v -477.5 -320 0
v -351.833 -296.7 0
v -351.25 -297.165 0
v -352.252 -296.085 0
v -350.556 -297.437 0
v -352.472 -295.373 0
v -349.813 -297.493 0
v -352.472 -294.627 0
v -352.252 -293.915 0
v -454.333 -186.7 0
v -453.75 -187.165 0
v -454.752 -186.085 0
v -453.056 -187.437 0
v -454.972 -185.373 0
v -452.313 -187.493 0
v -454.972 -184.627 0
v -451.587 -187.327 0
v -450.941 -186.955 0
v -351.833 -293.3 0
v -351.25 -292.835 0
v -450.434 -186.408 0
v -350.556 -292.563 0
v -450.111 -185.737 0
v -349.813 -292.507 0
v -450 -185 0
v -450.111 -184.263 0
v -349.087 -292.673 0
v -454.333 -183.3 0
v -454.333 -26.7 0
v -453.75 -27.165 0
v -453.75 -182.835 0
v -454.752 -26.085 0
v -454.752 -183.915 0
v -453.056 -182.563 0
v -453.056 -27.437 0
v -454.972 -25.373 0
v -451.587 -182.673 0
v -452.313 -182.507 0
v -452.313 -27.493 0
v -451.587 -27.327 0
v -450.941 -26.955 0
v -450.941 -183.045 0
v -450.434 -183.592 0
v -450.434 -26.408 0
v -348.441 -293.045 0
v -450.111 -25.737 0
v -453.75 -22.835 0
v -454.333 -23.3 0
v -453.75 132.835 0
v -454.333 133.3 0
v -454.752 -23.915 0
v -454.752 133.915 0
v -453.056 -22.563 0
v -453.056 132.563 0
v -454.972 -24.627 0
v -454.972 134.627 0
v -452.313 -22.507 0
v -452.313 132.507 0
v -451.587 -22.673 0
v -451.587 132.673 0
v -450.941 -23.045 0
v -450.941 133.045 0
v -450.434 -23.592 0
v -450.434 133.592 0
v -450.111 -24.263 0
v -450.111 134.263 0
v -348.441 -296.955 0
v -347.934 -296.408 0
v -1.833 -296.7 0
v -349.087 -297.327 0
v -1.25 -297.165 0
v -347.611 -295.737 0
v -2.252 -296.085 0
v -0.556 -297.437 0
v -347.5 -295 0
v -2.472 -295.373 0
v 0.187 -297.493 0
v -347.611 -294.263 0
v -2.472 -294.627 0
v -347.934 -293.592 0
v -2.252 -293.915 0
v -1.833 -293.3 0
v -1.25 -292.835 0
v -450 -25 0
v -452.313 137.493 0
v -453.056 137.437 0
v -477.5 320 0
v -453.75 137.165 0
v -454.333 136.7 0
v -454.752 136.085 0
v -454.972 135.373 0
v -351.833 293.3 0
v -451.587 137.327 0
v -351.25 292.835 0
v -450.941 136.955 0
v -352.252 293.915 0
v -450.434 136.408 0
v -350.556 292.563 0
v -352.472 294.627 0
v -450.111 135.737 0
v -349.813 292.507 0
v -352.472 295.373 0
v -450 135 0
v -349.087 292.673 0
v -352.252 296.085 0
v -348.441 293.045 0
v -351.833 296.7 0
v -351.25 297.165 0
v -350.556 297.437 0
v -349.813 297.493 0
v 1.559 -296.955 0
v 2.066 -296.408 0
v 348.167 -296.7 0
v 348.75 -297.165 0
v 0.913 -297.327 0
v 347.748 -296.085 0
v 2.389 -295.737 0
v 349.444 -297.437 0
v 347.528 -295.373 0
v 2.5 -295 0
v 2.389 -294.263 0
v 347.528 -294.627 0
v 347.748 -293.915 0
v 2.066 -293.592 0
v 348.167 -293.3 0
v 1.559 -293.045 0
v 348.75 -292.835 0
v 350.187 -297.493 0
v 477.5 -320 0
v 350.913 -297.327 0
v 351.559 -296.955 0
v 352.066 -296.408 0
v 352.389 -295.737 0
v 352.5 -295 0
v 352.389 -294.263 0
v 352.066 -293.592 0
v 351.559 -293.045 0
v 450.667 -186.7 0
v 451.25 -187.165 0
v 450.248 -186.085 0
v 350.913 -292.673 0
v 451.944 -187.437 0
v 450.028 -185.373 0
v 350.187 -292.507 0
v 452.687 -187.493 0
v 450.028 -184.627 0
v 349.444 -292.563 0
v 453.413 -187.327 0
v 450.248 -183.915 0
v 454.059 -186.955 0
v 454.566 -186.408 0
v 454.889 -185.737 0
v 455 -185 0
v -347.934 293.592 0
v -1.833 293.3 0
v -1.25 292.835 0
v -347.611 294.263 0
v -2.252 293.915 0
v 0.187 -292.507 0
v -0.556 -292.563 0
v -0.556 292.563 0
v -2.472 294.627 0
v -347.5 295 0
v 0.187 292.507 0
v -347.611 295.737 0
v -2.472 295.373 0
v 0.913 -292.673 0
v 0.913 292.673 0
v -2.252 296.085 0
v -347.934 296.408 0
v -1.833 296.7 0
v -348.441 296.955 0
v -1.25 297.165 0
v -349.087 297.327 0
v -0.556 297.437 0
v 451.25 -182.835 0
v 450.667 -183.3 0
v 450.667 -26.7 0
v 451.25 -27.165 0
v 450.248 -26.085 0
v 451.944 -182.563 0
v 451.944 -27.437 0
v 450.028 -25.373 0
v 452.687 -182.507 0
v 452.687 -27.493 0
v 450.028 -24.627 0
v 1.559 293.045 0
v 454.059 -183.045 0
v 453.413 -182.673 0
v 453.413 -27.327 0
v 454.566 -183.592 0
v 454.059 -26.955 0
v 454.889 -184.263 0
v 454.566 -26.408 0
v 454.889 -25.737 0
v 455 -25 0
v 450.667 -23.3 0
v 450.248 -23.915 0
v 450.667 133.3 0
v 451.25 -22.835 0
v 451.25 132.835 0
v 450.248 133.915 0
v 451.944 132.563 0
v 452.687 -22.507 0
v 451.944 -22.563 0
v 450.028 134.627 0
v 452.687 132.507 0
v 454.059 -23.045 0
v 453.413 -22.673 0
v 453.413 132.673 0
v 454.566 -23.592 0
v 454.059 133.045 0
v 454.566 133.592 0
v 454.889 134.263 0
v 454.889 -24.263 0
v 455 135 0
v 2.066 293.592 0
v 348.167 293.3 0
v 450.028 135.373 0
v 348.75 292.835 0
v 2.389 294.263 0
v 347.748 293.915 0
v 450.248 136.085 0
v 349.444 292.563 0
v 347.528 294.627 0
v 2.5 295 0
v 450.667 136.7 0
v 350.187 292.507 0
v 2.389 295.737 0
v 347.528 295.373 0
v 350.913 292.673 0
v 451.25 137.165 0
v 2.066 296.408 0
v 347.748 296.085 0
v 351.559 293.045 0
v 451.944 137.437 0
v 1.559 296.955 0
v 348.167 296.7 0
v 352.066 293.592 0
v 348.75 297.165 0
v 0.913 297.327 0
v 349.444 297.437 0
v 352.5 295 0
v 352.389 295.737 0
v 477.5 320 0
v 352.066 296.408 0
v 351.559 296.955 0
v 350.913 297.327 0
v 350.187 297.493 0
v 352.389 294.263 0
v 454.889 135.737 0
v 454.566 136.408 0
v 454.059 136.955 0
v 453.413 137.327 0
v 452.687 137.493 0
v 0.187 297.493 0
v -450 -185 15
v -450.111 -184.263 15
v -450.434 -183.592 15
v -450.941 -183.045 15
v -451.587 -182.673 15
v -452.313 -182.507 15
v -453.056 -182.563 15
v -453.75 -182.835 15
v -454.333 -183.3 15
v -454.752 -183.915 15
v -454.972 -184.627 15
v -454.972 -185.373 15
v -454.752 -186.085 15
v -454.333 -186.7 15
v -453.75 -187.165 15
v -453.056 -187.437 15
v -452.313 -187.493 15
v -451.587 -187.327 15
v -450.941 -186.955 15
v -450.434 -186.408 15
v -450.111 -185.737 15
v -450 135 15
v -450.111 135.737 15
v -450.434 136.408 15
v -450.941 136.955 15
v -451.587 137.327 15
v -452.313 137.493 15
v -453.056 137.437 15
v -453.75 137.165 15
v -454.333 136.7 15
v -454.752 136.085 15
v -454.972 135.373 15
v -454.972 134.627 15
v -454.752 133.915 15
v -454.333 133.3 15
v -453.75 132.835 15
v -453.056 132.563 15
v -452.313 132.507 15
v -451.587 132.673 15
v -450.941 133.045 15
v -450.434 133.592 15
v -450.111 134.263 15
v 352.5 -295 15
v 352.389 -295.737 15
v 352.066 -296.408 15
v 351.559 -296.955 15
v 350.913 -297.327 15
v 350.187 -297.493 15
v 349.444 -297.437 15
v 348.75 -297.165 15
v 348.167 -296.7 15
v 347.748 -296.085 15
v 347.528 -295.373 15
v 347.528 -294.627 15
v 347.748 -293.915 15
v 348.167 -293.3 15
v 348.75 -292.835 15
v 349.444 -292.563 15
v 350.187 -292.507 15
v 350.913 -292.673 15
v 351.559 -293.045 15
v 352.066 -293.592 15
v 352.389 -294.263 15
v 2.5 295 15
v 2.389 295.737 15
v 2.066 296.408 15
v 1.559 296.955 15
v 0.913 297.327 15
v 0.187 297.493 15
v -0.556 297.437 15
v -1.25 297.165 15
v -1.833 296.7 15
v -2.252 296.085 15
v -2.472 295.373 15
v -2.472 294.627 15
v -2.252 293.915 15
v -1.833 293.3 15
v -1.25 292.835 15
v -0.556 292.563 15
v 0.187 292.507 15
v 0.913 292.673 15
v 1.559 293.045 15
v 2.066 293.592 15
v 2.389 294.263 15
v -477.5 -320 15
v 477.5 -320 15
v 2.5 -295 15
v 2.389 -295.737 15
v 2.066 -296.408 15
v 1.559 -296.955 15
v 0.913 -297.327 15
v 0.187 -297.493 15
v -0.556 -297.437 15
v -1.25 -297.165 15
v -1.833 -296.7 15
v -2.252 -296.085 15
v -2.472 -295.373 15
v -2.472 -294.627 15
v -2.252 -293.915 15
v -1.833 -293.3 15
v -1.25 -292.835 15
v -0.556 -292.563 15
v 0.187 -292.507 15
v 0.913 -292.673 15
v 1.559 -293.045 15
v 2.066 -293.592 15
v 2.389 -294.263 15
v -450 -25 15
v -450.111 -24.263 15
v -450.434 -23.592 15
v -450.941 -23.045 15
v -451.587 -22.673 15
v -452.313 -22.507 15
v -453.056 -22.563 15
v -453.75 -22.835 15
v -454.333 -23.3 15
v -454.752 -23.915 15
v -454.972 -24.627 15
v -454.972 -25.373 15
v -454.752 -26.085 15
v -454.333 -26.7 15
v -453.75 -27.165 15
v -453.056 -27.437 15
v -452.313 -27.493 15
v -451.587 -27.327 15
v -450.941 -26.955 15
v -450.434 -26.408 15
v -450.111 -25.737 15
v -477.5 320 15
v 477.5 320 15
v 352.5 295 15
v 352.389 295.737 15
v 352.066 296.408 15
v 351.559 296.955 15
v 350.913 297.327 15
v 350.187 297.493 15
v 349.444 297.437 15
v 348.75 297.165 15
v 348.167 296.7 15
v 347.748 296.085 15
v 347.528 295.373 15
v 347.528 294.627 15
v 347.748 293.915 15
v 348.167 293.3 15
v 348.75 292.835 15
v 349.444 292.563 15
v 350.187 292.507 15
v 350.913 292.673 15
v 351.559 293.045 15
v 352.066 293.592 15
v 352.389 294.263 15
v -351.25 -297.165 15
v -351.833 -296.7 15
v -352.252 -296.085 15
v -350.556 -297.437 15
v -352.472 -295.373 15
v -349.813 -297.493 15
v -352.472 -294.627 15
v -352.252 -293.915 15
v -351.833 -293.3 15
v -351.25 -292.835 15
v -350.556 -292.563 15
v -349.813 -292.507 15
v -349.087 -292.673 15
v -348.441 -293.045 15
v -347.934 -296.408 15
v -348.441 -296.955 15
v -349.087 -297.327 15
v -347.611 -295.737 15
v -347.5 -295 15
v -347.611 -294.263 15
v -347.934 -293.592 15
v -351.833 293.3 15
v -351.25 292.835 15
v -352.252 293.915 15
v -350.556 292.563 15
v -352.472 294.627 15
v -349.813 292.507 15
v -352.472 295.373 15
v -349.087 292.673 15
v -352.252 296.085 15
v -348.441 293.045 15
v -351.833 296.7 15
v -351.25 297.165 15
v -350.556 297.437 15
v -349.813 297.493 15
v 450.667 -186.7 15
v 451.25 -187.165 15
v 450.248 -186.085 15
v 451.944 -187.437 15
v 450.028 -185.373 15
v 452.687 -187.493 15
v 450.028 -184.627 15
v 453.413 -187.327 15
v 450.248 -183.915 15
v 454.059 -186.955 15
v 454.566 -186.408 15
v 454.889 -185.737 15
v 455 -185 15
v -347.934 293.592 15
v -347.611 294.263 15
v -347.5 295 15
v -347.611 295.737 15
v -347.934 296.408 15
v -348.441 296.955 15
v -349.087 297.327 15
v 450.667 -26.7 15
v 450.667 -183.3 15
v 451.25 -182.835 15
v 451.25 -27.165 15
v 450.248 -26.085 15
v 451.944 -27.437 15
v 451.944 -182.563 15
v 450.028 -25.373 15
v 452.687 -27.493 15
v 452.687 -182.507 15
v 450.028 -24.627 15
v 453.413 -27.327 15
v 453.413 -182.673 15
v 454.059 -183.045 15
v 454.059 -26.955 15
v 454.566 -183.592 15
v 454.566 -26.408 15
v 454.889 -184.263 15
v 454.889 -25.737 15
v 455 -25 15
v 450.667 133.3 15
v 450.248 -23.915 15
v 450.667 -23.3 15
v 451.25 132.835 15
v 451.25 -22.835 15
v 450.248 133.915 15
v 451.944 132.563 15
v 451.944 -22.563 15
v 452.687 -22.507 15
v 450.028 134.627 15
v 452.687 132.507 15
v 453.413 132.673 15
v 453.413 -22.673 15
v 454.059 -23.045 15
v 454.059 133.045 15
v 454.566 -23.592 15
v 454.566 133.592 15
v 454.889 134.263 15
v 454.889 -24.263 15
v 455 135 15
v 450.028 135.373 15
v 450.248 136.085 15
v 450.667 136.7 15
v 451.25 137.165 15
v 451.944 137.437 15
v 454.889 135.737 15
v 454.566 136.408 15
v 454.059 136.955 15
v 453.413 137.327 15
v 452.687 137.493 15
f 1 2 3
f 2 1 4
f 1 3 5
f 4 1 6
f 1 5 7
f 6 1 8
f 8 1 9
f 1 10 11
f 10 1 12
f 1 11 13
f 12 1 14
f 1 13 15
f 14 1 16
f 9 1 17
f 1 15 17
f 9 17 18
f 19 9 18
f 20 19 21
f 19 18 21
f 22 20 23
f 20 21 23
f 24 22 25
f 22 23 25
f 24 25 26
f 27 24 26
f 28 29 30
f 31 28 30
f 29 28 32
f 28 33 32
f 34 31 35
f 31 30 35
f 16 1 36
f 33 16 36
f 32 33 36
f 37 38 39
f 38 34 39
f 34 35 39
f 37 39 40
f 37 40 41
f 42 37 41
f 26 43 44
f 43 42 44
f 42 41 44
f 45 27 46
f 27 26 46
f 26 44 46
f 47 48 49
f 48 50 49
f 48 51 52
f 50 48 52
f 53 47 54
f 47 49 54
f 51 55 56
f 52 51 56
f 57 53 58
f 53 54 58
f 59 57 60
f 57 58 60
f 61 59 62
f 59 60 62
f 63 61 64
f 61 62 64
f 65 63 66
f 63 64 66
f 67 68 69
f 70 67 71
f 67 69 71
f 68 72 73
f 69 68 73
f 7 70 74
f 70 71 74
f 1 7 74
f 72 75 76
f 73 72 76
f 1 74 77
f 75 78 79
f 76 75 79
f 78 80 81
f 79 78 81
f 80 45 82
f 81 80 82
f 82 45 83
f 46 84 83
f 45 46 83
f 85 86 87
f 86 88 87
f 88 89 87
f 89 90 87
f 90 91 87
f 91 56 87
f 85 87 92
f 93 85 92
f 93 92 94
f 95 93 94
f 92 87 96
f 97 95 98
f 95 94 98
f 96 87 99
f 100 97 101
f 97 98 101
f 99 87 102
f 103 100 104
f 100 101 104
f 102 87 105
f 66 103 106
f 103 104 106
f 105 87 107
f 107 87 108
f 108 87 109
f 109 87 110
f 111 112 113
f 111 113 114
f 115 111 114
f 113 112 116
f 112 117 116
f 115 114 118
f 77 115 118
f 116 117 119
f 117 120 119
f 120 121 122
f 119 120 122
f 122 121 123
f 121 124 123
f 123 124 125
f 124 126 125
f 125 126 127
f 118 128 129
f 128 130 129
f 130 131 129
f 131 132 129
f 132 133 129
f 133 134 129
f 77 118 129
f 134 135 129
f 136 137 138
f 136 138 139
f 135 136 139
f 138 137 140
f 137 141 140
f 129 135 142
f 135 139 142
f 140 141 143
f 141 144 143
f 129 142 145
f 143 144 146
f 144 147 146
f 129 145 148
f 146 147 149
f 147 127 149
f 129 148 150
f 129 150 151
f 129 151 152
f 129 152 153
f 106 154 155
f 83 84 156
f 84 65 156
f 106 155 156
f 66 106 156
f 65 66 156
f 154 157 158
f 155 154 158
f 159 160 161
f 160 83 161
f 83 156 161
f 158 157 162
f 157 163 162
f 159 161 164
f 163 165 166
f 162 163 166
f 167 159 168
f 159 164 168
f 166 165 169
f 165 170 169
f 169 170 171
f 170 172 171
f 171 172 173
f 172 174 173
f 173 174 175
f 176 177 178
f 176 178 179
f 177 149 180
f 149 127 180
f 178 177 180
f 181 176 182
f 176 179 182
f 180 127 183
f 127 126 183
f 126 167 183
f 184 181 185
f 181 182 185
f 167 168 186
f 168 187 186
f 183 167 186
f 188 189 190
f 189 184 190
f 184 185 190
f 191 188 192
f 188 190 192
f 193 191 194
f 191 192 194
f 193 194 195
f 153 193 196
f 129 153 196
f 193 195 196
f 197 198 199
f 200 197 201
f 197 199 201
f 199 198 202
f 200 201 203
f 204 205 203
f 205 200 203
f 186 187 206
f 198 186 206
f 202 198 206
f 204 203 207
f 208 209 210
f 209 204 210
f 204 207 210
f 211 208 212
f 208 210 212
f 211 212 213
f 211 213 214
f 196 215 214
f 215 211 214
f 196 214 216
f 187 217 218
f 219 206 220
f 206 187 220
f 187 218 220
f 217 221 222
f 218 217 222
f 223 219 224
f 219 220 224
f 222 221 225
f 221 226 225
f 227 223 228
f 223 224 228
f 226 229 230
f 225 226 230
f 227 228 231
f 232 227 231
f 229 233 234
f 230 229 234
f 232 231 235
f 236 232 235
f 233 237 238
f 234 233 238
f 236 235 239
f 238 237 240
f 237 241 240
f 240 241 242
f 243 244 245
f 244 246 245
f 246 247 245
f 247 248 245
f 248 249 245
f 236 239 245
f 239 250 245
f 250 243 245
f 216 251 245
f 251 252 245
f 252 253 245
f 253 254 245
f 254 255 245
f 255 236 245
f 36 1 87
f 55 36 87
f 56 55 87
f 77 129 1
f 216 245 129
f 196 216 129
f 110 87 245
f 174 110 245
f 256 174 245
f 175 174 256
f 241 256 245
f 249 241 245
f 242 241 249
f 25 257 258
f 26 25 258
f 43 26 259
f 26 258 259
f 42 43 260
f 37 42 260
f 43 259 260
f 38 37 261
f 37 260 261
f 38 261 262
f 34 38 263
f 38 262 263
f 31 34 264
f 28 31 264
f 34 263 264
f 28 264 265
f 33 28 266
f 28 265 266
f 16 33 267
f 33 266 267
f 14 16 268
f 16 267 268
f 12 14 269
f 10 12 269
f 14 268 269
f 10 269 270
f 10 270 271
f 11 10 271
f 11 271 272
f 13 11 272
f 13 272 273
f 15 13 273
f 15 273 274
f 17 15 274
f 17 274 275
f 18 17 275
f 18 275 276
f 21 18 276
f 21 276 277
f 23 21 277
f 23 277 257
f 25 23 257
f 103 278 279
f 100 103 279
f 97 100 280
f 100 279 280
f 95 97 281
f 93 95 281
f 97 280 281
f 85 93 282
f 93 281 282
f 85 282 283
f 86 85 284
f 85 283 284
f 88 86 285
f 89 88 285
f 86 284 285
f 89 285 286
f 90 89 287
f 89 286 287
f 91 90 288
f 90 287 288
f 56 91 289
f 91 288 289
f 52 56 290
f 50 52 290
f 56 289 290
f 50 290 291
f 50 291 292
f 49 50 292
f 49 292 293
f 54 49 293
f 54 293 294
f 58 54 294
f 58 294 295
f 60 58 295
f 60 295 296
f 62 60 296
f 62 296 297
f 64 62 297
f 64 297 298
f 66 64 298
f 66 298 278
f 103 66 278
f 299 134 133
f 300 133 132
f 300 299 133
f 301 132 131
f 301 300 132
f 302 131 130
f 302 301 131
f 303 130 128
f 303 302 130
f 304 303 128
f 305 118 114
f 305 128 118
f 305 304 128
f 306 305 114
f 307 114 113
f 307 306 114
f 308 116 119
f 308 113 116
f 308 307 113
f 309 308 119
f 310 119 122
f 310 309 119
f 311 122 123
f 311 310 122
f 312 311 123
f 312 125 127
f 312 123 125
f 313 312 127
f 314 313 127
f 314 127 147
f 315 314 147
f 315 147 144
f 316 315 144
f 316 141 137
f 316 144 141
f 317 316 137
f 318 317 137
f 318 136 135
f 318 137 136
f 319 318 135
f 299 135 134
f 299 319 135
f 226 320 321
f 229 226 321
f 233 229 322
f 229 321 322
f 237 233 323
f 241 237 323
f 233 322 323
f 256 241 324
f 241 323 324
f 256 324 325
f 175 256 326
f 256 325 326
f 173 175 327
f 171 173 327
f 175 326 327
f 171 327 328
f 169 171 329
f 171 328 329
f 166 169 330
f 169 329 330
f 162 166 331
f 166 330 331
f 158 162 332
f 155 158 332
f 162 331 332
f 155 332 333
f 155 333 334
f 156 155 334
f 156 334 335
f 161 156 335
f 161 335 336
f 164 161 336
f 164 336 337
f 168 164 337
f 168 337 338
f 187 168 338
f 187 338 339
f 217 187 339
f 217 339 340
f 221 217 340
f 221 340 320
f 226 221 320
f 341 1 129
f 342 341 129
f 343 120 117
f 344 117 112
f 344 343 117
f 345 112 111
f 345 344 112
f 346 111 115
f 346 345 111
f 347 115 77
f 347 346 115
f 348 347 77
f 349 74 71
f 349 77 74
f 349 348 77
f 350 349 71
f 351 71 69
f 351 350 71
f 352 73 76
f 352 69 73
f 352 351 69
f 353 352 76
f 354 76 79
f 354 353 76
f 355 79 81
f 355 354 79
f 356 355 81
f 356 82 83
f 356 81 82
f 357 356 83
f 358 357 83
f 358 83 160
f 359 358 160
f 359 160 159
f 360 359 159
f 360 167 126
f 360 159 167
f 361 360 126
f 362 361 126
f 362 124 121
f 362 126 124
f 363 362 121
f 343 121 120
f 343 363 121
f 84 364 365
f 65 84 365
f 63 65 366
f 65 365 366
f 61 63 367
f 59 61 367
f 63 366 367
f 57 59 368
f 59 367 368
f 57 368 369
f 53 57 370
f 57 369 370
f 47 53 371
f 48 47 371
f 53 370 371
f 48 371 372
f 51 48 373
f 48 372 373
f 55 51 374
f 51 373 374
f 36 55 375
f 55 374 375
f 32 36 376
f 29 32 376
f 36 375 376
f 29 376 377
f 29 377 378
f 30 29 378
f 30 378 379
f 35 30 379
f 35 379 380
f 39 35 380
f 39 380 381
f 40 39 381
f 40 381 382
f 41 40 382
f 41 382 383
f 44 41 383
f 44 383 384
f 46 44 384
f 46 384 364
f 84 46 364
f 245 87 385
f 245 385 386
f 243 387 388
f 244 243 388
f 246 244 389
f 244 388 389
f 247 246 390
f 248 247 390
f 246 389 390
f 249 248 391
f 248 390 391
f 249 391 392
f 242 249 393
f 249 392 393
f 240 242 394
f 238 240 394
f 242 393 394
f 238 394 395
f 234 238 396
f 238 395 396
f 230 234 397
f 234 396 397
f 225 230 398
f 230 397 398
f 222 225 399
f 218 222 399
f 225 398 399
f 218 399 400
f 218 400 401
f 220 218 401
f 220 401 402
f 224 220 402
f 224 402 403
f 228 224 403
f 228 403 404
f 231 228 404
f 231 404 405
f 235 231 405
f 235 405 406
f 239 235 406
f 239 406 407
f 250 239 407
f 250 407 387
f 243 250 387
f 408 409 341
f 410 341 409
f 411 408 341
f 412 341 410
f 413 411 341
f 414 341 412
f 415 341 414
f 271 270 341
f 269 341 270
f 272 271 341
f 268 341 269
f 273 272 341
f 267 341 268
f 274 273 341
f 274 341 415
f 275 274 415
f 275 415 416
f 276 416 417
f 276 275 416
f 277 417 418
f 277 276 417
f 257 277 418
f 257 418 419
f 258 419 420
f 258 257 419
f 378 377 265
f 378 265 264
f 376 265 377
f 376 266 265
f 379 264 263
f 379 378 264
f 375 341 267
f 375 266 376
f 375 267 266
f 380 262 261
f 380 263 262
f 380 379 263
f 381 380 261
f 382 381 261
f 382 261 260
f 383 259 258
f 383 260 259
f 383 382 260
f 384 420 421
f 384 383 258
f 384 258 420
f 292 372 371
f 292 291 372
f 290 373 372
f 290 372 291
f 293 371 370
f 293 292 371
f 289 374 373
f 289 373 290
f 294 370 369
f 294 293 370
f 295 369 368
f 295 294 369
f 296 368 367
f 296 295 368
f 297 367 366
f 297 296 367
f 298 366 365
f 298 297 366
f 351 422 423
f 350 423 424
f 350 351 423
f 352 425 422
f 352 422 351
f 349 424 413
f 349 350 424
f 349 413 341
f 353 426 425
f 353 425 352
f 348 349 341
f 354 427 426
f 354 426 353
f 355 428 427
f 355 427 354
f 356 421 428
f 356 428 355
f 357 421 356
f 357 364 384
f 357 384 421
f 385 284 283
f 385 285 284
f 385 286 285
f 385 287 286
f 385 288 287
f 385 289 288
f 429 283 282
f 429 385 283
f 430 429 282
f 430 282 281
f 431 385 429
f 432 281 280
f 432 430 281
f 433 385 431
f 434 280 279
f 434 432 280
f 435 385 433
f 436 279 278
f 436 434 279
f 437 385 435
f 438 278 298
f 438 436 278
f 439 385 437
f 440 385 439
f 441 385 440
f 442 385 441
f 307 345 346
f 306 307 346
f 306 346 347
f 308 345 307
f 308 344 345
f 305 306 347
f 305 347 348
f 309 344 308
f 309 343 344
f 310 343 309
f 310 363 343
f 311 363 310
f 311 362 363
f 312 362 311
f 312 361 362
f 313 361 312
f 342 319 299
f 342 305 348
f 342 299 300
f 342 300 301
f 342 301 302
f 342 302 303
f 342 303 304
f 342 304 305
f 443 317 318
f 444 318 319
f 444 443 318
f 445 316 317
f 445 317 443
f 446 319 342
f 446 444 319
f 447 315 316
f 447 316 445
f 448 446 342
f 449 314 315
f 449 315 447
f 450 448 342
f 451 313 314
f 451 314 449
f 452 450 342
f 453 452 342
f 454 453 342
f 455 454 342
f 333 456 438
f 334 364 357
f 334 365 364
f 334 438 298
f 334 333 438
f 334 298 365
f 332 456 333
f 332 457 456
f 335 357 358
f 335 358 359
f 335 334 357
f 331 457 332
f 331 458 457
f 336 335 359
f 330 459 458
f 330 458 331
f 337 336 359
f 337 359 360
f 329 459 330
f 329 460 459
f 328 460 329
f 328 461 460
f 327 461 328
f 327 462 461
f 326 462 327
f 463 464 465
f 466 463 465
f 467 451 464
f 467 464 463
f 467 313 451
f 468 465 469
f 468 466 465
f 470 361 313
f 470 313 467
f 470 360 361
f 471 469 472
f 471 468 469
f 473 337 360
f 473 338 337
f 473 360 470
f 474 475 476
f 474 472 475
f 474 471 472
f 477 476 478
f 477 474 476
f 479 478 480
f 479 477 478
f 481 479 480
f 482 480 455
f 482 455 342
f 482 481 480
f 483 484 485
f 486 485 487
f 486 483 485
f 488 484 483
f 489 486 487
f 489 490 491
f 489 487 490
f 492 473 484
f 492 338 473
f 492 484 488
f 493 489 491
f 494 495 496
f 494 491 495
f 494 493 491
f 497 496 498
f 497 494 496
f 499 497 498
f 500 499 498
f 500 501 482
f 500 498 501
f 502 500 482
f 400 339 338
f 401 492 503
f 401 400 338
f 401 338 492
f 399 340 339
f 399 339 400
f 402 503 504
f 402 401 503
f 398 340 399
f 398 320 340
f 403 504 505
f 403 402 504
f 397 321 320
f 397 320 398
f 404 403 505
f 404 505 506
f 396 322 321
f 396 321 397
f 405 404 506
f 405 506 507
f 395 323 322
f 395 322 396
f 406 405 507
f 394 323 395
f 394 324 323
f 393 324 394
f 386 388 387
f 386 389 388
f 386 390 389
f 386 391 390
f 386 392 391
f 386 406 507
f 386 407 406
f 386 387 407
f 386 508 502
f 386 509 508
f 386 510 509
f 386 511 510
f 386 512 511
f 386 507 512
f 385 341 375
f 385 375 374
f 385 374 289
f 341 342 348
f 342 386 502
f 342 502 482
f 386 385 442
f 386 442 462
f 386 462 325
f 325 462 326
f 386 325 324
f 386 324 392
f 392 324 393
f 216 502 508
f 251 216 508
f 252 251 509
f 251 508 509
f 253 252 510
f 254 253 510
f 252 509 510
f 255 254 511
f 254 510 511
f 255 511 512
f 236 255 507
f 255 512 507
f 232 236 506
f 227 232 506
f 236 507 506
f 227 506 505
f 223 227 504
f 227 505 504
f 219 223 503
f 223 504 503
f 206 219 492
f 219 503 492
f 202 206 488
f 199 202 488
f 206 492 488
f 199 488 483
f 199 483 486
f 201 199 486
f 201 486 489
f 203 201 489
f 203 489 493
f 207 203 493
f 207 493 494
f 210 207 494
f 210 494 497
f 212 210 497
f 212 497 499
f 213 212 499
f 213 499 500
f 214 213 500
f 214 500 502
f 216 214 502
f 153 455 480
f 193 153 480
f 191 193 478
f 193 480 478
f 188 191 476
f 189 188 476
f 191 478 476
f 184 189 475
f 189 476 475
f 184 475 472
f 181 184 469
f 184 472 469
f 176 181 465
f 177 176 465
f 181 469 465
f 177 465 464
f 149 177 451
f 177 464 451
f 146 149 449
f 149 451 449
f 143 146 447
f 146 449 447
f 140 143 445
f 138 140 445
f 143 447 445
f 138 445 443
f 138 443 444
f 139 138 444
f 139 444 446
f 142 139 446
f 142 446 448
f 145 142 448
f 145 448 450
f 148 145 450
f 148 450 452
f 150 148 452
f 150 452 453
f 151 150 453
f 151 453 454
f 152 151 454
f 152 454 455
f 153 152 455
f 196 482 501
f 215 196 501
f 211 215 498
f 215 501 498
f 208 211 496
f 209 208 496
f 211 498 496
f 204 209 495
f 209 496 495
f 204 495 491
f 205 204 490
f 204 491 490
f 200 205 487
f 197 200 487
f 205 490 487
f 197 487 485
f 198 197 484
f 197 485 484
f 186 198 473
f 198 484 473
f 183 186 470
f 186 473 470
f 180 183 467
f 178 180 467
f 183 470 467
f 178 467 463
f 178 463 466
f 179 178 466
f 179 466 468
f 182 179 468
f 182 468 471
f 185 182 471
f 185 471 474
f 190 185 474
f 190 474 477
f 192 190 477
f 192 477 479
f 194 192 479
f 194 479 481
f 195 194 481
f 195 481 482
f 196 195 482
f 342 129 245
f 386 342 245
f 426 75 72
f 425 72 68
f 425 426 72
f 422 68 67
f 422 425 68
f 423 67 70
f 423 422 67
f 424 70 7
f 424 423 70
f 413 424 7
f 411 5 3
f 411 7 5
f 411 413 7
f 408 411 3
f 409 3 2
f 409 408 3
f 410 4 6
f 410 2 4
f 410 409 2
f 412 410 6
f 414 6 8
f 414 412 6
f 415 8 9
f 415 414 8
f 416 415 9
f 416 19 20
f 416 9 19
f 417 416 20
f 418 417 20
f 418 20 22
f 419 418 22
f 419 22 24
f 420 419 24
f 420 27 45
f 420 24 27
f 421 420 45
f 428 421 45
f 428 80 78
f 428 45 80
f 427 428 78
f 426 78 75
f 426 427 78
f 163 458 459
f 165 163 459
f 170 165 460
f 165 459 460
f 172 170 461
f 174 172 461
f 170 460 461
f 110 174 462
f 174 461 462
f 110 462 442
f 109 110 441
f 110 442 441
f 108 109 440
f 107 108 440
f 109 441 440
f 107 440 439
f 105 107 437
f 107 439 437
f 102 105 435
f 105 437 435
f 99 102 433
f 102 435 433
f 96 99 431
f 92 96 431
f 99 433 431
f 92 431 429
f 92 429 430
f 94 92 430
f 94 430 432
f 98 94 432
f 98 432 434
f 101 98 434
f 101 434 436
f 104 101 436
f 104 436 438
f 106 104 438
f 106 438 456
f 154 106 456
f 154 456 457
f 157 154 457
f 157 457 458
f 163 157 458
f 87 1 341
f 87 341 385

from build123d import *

# Parameters (mm, degrees)
SKETCH_1_W               = 955
SKETCH_1_H               = 640
EXTRUDE_1_DEPTH          = 15
SKETCH_2_R               = 2.5
CUT_EXTRUDE_1_DEPTH      = 1
CUT_EXTRUDE_1_DEPTH_BACK = 16
SKETCH_2_3_R             = 2.5
CUT_EXTRUDE_2_DEPTH      = 16


with BuildPart() as part:
    # ｽｹｯﾁ1 → ﾎﾞｽ - 押し出し1 (new body)
    with BuildSketch(Plane.XY):
        Rectangle(SKETCH_1_W, SKETCH_1_H)
    extrude(amount=EXTRUDE_1_DEPTH)

    # ｽｹｯﾁ2 → ｶｯﾄ - 押し出し1 (cut, two sides)
    with BuildSketch(Plane.XY.offset(15)) as cut_extrude_1_sk:
        with Locations((-452.5, -185)):
            Circle(SKETCH_2_R)
        with Locations((452.5, -185)):
            Circle(SKETCH_2_R)
        with Locations((452.5, -25)):
            Circle(SKETCH_2_R)
        with Locations((-452.5, -25)):
            Circle(SKETCH_2_R)
        with Locations((-452.5, 135)):
            Circle(SKETCH_2_R)
        with Locations((452.5, 135)):
            Circle(SKETCH_2_R)
    extrude(amount=CUT_EXTRUDE_1_DEPTH, mode=Mode.SUBTRACT)
    extrude(cut_extrude_1_sk.sketch, amount=-CUT_EXTRUDE_1_DEPTH_BACK, mode=Mode.SUBTRACT)

    # ｽｹｯﾁ2<3> → ｶｯﾄ - 押し出し2 (cut, through all)
    with BuildSketch(Plane.XY.offset(15)):
        with Locations((0, 295)):
            Circle(SKETCH_2_3_R)
        with Locations((-350, 295)):
            Circle(SKETCH_2_3_R)
        with Locations((350, 295)):
            Circle(SKETCH_2_3_R)
    cut_extrude_2 = extrude(amount=-CUT_EXTRUDE_2_DEPTH, mode=Mode.SUBTRACT)

    # ﾐﾗｰ1: ｶｯﾄ - 押し出し2 across plane
    add(cut_extrude_2.mirror(Plane.ZX), mode=Mode.SUBTRACT)


solid = part.part
